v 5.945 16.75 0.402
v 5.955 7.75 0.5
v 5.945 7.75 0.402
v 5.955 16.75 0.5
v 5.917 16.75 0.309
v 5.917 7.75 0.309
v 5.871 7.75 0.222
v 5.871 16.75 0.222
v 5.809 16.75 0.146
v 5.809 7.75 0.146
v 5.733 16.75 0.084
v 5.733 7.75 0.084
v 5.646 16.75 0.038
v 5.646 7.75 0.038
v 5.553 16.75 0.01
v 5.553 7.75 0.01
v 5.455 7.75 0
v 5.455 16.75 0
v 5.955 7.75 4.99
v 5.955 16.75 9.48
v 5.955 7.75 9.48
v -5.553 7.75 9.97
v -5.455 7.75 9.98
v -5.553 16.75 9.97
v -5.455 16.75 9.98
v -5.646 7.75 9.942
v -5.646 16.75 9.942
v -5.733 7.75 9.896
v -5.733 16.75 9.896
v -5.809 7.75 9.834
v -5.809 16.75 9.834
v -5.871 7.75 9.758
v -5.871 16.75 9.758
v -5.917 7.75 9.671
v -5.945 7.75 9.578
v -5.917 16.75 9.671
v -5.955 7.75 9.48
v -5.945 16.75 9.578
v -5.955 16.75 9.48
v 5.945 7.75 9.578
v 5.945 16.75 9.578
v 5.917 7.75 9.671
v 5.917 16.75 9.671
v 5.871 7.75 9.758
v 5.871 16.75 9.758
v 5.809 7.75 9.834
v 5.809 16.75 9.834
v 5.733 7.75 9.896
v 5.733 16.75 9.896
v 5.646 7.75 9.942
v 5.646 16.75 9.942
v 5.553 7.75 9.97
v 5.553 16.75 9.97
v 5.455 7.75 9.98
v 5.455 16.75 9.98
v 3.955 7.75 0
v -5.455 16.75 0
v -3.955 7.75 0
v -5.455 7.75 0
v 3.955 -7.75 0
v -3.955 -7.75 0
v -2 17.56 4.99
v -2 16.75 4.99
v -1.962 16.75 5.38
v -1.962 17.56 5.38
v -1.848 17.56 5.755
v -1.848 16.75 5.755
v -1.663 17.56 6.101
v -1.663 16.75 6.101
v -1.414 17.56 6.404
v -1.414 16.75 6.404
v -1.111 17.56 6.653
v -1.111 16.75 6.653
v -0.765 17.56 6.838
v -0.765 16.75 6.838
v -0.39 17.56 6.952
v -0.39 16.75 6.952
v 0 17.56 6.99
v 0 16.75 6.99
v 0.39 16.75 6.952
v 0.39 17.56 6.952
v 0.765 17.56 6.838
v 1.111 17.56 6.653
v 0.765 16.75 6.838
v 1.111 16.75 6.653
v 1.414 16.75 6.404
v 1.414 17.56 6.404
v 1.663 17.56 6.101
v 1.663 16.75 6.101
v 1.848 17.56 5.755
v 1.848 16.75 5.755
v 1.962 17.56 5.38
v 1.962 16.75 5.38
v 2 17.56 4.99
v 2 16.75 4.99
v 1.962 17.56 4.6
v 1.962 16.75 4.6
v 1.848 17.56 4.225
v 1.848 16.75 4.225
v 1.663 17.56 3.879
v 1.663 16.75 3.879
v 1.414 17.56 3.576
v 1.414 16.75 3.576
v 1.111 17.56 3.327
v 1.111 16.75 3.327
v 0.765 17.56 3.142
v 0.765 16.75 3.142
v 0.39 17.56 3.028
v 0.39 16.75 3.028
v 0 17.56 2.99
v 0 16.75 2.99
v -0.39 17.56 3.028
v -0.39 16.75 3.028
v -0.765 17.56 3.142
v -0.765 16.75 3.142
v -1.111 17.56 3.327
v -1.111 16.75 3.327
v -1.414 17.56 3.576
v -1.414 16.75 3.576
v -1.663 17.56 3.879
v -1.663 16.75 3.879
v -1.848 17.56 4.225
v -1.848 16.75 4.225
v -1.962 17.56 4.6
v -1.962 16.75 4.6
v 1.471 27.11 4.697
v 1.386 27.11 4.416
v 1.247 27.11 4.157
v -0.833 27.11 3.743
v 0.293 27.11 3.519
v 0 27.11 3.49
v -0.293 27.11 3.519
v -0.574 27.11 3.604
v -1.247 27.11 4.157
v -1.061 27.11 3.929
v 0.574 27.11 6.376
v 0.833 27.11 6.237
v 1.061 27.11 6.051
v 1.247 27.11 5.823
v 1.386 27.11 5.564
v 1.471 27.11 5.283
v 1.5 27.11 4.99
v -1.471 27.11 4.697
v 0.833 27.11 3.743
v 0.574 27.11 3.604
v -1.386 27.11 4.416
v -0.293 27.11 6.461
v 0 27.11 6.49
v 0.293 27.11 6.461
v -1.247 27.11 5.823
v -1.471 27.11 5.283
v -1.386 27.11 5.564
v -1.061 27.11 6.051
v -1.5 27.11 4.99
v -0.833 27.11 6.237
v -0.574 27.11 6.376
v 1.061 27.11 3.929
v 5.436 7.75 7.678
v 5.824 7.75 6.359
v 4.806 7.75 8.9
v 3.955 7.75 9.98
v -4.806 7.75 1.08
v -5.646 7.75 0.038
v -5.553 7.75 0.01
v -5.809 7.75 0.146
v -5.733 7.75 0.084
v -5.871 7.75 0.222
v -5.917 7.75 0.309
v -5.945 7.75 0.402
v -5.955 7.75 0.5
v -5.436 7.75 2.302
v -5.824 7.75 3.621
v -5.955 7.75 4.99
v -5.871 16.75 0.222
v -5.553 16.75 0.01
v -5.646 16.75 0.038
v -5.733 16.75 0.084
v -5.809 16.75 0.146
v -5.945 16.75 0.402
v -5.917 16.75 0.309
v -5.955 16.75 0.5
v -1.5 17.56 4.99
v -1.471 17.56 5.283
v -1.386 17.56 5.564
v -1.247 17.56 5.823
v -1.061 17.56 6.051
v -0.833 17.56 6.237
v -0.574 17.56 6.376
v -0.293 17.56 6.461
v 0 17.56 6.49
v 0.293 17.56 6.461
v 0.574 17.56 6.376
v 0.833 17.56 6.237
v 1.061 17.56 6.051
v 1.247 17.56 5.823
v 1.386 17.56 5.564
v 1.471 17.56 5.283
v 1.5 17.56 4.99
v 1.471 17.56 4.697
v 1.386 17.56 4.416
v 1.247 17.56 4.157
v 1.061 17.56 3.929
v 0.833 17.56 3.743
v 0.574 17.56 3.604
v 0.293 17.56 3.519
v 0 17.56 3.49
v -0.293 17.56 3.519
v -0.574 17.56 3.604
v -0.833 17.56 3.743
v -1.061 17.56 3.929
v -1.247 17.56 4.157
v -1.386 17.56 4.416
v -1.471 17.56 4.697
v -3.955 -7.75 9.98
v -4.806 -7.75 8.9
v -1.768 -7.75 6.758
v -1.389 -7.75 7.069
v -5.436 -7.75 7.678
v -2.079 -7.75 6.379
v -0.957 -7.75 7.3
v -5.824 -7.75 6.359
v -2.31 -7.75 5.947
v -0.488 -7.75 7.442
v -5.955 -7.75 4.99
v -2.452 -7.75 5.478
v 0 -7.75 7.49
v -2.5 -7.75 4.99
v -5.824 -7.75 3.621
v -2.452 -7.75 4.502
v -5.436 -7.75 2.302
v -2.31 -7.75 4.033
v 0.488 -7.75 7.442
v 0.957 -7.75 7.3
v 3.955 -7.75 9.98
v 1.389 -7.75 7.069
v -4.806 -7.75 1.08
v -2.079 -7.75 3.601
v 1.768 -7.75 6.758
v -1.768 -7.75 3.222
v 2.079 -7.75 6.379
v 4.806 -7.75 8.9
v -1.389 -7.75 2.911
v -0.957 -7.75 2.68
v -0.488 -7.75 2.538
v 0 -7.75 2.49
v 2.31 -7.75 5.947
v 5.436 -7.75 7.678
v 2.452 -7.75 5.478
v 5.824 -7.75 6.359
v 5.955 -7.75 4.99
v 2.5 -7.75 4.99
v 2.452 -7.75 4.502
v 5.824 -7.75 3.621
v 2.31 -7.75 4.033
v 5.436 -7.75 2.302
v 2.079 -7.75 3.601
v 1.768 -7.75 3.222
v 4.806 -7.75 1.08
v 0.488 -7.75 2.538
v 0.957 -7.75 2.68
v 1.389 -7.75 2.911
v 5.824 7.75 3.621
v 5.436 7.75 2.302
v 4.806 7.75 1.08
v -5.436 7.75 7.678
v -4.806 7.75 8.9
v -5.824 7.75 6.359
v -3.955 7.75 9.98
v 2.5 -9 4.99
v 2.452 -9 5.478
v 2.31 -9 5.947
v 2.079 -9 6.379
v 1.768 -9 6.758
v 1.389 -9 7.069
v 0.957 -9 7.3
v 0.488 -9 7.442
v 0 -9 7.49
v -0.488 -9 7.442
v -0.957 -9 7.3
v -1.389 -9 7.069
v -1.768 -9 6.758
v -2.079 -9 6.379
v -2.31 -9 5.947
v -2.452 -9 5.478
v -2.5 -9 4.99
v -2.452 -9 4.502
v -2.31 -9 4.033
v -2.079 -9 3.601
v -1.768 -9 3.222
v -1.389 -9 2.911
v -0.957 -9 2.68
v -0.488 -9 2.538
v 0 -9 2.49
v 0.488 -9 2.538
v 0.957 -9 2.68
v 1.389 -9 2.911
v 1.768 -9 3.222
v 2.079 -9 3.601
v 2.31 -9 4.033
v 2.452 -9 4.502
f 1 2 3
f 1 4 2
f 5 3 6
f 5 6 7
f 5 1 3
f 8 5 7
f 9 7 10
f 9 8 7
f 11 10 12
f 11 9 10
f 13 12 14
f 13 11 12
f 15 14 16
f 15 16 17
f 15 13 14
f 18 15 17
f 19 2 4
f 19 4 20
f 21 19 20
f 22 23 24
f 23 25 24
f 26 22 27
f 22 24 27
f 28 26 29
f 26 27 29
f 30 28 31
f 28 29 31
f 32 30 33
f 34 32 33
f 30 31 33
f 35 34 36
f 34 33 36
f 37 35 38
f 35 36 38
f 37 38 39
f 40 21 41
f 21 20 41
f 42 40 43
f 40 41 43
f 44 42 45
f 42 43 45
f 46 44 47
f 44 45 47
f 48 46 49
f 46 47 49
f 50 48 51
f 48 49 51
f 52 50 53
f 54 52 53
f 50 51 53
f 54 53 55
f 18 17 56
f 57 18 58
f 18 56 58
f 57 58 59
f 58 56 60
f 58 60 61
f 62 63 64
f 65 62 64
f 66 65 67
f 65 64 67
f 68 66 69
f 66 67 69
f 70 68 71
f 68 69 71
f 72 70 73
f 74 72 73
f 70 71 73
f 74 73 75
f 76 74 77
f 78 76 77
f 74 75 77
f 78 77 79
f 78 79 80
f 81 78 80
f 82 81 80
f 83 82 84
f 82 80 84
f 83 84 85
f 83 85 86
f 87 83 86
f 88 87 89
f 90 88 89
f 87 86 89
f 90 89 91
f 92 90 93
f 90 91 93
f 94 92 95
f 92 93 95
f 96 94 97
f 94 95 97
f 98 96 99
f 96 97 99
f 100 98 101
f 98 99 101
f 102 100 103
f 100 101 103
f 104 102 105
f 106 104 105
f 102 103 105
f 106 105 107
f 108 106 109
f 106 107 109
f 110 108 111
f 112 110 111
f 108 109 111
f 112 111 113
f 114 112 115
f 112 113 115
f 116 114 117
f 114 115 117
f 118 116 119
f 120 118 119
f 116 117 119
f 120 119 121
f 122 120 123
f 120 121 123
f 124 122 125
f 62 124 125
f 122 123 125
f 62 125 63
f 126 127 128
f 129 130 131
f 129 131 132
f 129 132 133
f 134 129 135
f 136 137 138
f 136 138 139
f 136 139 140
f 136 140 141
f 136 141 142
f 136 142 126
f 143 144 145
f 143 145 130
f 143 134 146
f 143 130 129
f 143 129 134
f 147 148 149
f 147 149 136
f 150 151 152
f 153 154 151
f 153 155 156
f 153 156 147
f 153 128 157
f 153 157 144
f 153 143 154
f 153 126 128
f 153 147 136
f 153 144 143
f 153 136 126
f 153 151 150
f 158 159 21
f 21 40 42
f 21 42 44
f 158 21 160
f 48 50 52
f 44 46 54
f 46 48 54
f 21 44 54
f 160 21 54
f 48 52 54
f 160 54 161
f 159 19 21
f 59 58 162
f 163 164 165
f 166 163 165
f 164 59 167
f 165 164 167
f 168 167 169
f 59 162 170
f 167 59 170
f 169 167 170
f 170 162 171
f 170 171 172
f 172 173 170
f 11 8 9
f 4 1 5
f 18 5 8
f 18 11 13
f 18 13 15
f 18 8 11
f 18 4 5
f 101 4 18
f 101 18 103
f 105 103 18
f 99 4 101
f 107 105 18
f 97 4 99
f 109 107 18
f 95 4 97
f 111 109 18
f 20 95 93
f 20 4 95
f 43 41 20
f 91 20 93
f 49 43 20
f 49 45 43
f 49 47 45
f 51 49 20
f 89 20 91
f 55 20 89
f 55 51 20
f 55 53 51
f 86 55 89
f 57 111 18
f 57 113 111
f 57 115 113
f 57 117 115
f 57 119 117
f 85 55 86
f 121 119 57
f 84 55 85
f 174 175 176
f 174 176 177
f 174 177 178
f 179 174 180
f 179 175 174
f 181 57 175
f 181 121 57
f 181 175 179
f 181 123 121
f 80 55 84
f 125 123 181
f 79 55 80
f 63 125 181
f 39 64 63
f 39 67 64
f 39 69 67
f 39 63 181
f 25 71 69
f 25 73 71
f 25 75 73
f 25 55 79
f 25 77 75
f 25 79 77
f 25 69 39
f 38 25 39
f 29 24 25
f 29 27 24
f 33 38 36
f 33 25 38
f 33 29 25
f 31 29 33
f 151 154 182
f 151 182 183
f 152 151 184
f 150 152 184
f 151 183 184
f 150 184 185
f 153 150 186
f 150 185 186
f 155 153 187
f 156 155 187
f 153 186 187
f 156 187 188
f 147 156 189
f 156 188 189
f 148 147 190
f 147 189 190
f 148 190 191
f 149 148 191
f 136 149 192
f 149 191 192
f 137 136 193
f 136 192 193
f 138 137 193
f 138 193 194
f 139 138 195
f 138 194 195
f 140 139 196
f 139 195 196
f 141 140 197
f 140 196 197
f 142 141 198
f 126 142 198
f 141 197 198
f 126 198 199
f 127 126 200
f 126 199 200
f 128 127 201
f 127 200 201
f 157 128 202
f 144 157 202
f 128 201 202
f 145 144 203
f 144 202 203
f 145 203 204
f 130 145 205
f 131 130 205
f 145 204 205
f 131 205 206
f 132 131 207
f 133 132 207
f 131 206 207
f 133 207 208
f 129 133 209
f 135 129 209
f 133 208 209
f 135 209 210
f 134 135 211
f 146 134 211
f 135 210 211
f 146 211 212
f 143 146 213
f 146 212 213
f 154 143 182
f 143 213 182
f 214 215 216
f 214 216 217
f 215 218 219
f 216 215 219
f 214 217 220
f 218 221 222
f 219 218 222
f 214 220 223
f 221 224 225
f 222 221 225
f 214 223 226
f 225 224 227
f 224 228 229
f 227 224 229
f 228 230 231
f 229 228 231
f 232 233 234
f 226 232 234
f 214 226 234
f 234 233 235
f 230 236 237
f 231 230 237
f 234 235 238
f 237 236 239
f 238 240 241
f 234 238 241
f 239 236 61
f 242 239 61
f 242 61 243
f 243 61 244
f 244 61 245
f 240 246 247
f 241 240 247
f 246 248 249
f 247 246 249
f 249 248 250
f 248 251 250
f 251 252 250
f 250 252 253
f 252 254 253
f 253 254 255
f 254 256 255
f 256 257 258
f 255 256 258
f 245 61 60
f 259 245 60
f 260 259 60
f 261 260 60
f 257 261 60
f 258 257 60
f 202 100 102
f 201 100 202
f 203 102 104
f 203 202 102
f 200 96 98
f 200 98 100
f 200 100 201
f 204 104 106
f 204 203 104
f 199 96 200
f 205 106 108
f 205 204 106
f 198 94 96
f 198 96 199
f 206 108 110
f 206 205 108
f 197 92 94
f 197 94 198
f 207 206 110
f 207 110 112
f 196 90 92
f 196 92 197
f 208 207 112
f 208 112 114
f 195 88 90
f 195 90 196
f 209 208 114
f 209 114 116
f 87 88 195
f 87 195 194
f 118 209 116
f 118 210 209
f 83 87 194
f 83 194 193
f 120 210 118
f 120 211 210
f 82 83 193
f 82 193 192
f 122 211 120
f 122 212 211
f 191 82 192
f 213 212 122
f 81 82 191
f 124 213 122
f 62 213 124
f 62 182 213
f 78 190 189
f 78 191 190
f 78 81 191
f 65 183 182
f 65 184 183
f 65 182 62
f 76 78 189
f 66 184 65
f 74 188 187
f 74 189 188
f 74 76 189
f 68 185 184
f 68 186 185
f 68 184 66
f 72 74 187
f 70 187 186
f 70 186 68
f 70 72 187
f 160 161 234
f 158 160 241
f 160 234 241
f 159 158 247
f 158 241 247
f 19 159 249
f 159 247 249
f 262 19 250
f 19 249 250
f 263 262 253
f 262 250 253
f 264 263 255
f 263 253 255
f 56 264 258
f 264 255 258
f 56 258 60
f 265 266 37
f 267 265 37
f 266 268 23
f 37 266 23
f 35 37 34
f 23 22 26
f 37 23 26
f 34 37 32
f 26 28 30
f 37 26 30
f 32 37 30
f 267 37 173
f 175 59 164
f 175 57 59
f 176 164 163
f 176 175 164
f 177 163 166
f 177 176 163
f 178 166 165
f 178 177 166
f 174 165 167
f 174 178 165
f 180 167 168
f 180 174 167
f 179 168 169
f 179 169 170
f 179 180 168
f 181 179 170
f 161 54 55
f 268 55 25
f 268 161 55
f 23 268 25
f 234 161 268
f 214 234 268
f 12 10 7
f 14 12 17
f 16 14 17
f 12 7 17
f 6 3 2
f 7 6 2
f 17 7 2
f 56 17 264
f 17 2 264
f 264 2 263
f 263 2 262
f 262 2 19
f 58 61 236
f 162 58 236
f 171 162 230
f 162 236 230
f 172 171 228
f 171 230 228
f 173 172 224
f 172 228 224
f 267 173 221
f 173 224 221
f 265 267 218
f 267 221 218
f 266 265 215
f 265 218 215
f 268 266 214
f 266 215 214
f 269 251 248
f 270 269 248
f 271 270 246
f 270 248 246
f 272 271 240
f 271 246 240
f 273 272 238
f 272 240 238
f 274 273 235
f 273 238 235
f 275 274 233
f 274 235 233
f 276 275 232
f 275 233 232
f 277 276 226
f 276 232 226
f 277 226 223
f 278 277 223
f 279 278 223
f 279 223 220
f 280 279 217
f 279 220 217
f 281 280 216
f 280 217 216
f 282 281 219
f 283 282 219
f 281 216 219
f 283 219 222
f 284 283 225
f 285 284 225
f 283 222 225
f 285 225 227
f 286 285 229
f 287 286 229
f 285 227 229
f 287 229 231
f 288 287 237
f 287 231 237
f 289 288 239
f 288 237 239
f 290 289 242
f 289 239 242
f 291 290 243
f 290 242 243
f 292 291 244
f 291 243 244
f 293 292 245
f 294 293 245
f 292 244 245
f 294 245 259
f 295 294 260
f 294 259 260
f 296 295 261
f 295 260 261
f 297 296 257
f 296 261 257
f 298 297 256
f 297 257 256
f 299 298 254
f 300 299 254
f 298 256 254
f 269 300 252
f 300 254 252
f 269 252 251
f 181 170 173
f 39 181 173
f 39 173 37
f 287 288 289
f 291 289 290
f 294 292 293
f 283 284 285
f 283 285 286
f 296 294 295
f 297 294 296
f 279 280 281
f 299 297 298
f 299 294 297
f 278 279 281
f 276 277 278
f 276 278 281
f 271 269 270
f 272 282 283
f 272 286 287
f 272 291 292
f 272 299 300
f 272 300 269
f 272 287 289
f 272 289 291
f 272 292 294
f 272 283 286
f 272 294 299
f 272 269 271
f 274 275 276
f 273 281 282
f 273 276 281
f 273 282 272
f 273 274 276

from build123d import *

# Parameters (mm, degrees)
F0_W      = 11.91
F0_H      = 15.5
F1_DEPTH  = 9.98
F3_DEPTH  = 25.4
F4_R      = 2.5
F5_DEPTH  = 1.25
F6_W      = 11.91
F6_H      = 9.98
F7_DEPTH  = 9
F8_R      = 2
F9_DEPTH  = 0.81
F10_R     = 1.5
F11_DEPTH = 9.55
F12_R     = 0.5


with BuildPart() as f1:
    # F0 (on Top) → F1 (new body)
    with BuildSketch(Plane.XY):
        Rectangle(F0_W, F0_H)
    extrude(amount=F1_DEPTH)

    # F2 (on face) → F3 (cut)
    with BuildSketch(Plane.XZ.offset(7.75)):
        with BuildLine():
            ThreePointArc((-3.955, 0), (-5.955, 4.99), (-3.955, 9.98))
            Line((-3.955, 9.98), (-7.13, 9.98))
            Line((-7.13, 9.98), (-7.13, 0))
            Line((-7.13, 0), (-3.955, 0))
        make_face()
        with BuildLine():
            Line((7.13, 9.98), (3.955, 9.98))
            ThreePointArc((3.955, 9.98), (5.955, 4.99), (3.955, 0))
            Line((3.955, 0), (7.13, 0))
            Line((7.13, 0), (7.13, 9.98))
        make_face()
    extrude(amount=-F3_DEPTH, mode=Mode.SUBTRACT)

    # F4 (on face) → F5 (join)
    with BuildSketch(Plane.XZ.offset(7.75)):
        with Locations((0, 4.99)):
            Circle(F4_R)
    extrude(amount=F5_DEPTH)

    # F6 (on face) → F7 (join)
    with BuildSketch(Plane(origin=(0, 7.75, 0), x_dir=(-1, 0, 0), z_dir=(0, 1, 0))):
        with Locations((0, 4.99)):
            Rectangle(F6_W, F6_H)
    extrude(amount=F7_DEPTH)

    # F8 (on face) → F9 (join)
    with BuildSketch(Plane(origin=(0, 16.75, 0), x_dir=(-1, 0, 0), z_dir=(0, 1, 0))):
        with Locations((0, 4.99)):
            Circle(F8_R)
    extrude(amount=F9_DEPTH)

    # F10 (on face) → F11 (join)
    with BuildSketch(Plane(origin=(0, 17.56, 0), x_dir=(-1, 0, 0), z_dir=(0, 1, 0))):
        with Locations((0, 4.99)):
            Circle(F10_R)
    extrude(amount=F11_DEPTH)

    # F12
    f12_edges = [f1.edges().sort_by_distance(p)[0] for p in [
        (5.955, 12.25, 9.98),
        (-5.955, 12.25, 9.98),
        (5.955, 12.25, 0),
        (-5.955, 12.25, 0),
    ]]
    fillet(f12_edges, radius=F12_R)


solid = f1.part
